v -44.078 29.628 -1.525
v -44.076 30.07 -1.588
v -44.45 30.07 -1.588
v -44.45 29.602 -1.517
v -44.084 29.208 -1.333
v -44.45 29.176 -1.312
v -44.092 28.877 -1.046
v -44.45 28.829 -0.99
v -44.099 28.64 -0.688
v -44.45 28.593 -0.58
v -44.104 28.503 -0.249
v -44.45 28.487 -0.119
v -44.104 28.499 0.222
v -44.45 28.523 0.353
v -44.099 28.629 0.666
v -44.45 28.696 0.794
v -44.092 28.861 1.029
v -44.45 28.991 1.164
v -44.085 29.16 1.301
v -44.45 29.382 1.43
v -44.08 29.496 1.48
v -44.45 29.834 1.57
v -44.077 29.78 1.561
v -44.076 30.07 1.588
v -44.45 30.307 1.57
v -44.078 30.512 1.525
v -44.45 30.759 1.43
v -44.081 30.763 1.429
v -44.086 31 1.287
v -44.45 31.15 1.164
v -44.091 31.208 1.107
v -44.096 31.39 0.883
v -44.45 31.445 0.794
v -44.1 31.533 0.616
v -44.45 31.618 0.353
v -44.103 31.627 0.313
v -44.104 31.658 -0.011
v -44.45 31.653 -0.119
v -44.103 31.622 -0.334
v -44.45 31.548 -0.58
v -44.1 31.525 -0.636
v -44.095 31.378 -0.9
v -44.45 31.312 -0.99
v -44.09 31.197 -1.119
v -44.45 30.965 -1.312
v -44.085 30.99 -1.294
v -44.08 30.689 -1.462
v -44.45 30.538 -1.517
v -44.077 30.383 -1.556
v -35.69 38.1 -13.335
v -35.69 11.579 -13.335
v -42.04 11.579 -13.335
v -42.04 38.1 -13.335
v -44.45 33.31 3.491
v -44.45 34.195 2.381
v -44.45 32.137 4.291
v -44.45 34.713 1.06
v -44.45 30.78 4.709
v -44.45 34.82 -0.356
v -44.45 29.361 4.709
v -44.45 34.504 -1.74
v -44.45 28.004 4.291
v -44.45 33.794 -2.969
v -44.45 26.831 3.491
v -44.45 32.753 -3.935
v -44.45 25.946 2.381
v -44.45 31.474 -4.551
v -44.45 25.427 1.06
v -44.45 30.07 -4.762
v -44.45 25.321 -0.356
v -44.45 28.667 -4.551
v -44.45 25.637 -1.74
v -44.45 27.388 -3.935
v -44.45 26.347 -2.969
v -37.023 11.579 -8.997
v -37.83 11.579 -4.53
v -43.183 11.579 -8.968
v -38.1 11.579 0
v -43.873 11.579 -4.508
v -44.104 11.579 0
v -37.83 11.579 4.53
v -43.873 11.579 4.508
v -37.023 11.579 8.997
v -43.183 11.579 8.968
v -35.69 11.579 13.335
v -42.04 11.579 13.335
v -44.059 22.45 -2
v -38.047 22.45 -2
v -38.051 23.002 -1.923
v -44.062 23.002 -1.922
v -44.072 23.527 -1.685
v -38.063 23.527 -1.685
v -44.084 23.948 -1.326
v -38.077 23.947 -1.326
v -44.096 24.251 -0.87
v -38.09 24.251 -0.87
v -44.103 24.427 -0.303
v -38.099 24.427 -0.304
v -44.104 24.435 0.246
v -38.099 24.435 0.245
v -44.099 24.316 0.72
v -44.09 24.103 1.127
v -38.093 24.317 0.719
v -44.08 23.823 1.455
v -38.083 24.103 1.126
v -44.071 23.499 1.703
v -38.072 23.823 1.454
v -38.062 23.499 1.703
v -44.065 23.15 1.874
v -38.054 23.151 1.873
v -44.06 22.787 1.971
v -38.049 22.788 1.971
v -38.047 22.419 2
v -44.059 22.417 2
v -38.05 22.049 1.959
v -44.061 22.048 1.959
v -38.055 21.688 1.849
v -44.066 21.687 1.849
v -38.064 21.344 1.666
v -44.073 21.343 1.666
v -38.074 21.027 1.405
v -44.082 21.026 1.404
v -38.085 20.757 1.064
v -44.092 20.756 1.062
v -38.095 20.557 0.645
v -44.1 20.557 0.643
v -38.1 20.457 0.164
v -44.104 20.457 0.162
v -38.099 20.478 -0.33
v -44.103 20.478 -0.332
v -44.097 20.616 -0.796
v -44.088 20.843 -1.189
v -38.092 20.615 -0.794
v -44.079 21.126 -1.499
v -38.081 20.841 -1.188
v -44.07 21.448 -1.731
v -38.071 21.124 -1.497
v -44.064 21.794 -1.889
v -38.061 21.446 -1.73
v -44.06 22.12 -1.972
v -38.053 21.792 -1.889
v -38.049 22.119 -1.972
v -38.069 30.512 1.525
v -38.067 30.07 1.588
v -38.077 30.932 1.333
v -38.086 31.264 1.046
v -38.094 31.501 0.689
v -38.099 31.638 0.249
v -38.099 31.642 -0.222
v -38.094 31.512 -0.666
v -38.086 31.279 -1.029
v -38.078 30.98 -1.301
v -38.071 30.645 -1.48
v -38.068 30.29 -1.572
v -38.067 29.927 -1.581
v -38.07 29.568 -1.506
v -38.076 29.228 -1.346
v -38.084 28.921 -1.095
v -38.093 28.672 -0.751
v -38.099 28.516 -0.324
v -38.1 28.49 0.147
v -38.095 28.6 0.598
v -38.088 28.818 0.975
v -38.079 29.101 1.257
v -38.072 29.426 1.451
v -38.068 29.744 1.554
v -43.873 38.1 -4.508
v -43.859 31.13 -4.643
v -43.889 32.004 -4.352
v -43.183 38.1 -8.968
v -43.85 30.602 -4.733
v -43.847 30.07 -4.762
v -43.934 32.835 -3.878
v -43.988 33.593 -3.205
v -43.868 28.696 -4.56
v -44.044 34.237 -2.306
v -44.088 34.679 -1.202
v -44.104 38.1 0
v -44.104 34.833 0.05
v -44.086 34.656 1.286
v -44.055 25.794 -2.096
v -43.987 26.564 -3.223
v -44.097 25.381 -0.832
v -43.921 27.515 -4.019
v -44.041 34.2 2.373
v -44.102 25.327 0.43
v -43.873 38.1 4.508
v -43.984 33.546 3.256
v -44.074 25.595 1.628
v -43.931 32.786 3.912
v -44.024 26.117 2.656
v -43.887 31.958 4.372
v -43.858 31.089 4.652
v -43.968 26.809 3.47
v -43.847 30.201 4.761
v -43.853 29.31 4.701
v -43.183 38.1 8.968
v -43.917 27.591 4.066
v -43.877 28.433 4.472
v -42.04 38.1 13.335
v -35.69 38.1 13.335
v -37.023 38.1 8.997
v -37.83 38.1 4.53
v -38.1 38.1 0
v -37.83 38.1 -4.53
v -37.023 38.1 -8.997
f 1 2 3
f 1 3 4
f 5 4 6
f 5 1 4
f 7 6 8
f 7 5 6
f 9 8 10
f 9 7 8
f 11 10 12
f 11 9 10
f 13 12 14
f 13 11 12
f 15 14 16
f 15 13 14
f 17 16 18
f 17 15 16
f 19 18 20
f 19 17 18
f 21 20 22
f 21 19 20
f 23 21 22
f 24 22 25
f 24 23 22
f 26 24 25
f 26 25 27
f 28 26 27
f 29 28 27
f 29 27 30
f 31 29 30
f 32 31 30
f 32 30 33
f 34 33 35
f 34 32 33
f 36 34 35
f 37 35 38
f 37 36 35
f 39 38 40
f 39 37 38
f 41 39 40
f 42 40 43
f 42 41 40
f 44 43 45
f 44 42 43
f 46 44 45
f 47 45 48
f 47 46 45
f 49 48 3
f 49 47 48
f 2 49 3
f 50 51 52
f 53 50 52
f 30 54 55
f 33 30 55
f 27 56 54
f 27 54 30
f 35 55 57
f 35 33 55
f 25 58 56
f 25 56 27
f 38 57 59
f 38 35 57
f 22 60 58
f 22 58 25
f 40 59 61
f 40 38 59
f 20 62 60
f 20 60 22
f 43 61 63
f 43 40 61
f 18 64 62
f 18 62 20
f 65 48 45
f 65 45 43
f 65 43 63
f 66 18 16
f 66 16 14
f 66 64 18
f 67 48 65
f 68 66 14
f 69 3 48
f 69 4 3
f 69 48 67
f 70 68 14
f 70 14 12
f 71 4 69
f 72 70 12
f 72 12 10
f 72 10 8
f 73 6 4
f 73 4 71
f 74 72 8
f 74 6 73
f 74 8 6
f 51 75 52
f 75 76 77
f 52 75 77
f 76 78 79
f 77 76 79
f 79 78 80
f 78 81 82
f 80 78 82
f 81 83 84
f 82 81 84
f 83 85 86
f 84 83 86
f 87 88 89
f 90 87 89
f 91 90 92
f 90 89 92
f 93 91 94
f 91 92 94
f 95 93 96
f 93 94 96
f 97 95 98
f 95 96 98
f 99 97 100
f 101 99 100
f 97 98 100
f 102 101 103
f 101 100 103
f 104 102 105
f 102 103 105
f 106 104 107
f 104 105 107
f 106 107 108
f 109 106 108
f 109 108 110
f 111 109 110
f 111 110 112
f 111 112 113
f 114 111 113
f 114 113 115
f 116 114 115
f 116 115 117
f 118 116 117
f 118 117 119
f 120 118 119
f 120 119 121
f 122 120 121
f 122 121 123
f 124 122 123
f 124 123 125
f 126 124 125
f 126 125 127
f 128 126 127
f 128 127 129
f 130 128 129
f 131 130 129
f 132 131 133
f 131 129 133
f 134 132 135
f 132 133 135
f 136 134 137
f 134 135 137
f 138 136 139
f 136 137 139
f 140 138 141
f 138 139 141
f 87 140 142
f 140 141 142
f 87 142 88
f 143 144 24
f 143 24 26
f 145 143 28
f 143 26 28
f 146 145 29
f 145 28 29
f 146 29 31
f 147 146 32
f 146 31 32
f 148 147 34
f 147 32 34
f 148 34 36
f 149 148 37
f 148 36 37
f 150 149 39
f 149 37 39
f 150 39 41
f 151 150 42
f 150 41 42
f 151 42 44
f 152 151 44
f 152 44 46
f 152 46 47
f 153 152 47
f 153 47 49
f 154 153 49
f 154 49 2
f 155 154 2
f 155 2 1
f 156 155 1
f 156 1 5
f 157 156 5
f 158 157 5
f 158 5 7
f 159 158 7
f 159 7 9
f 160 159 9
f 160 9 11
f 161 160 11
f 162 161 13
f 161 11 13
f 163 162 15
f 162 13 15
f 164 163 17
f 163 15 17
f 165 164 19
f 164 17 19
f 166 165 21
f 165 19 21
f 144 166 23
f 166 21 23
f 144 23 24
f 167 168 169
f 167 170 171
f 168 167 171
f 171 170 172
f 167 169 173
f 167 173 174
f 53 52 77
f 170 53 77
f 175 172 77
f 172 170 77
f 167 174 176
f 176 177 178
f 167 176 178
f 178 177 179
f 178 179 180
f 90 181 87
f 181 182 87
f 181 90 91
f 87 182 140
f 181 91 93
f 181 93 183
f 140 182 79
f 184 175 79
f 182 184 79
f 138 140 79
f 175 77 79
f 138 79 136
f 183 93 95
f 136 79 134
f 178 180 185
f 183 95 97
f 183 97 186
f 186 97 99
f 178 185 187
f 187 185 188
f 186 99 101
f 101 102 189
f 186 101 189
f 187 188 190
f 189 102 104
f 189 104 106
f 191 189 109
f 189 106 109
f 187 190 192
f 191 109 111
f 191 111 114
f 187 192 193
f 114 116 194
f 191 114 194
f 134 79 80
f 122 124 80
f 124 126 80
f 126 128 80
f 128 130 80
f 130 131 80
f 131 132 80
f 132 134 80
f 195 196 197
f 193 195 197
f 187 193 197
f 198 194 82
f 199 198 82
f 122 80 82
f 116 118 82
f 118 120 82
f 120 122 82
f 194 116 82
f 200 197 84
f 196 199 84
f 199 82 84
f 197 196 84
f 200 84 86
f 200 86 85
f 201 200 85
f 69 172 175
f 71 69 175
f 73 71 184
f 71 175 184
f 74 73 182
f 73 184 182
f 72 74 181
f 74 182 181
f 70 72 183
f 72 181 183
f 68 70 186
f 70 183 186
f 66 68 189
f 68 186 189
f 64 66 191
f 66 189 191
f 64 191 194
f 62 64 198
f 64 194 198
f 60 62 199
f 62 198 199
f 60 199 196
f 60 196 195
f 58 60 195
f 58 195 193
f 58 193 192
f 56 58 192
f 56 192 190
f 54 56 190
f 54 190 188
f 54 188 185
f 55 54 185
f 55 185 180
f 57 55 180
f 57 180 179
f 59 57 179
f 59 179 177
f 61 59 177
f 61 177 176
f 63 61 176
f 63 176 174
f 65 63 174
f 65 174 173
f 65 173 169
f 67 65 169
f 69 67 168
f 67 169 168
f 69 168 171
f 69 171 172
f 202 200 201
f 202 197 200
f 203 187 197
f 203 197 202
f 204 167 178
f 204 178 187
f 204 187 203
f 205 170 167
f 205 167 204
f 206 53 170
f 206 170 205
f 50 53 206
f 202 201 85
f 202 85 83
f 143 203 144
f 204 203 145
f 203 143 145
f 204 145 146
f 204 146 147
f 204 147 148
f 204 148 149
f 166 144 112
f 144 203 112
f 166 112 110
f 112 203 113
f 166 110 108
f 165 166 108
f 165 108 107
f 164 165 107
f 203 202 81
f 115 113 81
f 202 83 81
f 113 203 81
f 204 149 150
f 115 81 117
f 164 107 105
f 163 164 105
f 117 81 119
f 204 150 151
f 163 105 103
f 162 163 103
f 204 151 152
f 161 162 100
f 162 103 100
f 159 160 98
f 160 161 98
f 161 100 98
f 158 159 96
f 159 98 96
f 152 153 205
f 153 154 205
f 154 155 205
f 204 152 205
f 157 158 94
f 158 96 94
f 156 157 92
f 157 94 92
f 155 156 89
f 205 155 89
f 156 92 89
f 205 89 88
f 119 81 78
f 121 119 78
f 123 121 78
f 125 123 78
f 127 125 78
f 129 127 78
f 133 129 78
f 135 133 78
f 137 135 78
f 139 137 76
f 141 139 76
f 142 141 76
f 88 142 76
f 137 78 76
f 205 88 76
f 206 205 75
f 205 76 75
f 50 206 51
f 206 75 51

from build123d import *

# Parameters (mm, degrees)
BOSS_EXTRUDE1_DEPTH     = 38.1
SKETCH2_R               = 4.7625
SKETCH2_R_2             = 1.5875
BOSS_EXTRUDE3_DEPTH     = 2.409836439
CUT_EXTRUDE1_START      = -11.579198
CUT_EXTRUDE1_DEPTH      = 11.579198
SKETCH5_R               = 1.5875
CUT_EXTRUDE4_DEPTH      = 42.305774048
CUT_EXTRUDE5_REACH      = 43.306
CUT_EXTRUDE5_END_RADIUS = 44.104394081
SKETCH6_R               = 2


with BuildPart() as part:
    # Sketch1 → Boss-Extrude1 (new body)
    with BuildSketch(Plane(origin=(0, 0, 0), x_dir=(1, 0, 0), z_dir=(0, 1, 0))):
        with BuildLine():
            Line((-42.040163561, -13.335), (-35.690163561, -13.335))
            ThreePointArc((-35.690163561, -13.335), (-38.1, 0), (-35.690163561, 13.335))
            Line((-35.690163561, 13.335), (-42.040163561, 13.335))
            ThreePointArc((-42.040163561, 13.335), (-44.104394081, 0), (-42.040163561, -13.335))
        make_face()
    extrude(amount=BOSS_EXTRUDE1_DEPTH)

    # Sketch2 → Boss-Extrude3 (add)
    with BuildSketch(Plane.ZY.offset(42.040163561)):
        with Locations(Location((0, 30.070397704, 0), (0, 0, 180))):
            Circle(SKETCH2_R)
        with Locations(Location((0, 30.070397704, 0), (0, 0, 180))):
            Circle(SKETCH2_R_2, mode=Mode.SUBTRACT)
    extrude(amount=BOSS_EXTRUDE3_DEPTH)

    # Sketch3 → Cut-Extrude1 (cut)
    with BuildSketch(Plane.XZ.offset(CUT_EXTRUDE1_START)):
        with BuildLine():
            Line((-42.040163561, 13.335), (-35.690163561, 13.335))
            ThreePointArc((-35.690163561, 13.335), (-38.1, 0), (-35.690163561, -13.335))
            Line((-35.690163561, -13.335), (-42.040163561, -13.335))
            ThreePointArc((-42.040163561, -13.335), (-44.104394081, 0), (-42.040163561, 13.335))
        make_face()
    extrude(amount=CUT_EXTRUDE1_DEPTH, mode=Mode.SUBTRACT)

    # Sketch5 → Cut-Extrude4 (cut, through all)
    with BuildSketch(Plane.ZY.offset(44.45)):
        with Locations((0, 30.070397704)):
            Circle(SKETCH5_R)
    extrude(amount=-CUT_EXTRUDE4_DEPTH, mode=Mode.SUBTRACT)

    # Cut-Extrude5: up to this cylinder (the profile starts inside it)
    cut_extrude5_end = Plane(origin=(0, 22.450398, 0), z_dir=(0, -1, 0)) * Cylinder(CUT_EXTRUDE5_END_RADIUS, 175.820788161, mode=Mode.PRIVATE)
    # Sketch6 → Cut-Extrude5 (cut, up to the surface)
    with BuildSketch(Plane(origin=(-35.690163561, 0, 0), x_dir=(0, 0, -1), z_dir=(1, 0, 0)), mode=Mode.PRIVATE) as cut_extrude5_sk1:
        with Locations((0, 22.450397704)):
            Circle(SKETCH6_R)
    cut_extrude5_tool1 = extrude(cut_extrude5_sk1.sketch, amount=-CUT_EXTRUDE5_REACH, mode=Mode.PRIVATE) & cut_extrude5_end
    add(cut_extrude5_tool1.solids().sort_by_distance((-35.690164, 22.450398, 0))[0], mode=Mode.SUBTRACT)


solid = part.part
